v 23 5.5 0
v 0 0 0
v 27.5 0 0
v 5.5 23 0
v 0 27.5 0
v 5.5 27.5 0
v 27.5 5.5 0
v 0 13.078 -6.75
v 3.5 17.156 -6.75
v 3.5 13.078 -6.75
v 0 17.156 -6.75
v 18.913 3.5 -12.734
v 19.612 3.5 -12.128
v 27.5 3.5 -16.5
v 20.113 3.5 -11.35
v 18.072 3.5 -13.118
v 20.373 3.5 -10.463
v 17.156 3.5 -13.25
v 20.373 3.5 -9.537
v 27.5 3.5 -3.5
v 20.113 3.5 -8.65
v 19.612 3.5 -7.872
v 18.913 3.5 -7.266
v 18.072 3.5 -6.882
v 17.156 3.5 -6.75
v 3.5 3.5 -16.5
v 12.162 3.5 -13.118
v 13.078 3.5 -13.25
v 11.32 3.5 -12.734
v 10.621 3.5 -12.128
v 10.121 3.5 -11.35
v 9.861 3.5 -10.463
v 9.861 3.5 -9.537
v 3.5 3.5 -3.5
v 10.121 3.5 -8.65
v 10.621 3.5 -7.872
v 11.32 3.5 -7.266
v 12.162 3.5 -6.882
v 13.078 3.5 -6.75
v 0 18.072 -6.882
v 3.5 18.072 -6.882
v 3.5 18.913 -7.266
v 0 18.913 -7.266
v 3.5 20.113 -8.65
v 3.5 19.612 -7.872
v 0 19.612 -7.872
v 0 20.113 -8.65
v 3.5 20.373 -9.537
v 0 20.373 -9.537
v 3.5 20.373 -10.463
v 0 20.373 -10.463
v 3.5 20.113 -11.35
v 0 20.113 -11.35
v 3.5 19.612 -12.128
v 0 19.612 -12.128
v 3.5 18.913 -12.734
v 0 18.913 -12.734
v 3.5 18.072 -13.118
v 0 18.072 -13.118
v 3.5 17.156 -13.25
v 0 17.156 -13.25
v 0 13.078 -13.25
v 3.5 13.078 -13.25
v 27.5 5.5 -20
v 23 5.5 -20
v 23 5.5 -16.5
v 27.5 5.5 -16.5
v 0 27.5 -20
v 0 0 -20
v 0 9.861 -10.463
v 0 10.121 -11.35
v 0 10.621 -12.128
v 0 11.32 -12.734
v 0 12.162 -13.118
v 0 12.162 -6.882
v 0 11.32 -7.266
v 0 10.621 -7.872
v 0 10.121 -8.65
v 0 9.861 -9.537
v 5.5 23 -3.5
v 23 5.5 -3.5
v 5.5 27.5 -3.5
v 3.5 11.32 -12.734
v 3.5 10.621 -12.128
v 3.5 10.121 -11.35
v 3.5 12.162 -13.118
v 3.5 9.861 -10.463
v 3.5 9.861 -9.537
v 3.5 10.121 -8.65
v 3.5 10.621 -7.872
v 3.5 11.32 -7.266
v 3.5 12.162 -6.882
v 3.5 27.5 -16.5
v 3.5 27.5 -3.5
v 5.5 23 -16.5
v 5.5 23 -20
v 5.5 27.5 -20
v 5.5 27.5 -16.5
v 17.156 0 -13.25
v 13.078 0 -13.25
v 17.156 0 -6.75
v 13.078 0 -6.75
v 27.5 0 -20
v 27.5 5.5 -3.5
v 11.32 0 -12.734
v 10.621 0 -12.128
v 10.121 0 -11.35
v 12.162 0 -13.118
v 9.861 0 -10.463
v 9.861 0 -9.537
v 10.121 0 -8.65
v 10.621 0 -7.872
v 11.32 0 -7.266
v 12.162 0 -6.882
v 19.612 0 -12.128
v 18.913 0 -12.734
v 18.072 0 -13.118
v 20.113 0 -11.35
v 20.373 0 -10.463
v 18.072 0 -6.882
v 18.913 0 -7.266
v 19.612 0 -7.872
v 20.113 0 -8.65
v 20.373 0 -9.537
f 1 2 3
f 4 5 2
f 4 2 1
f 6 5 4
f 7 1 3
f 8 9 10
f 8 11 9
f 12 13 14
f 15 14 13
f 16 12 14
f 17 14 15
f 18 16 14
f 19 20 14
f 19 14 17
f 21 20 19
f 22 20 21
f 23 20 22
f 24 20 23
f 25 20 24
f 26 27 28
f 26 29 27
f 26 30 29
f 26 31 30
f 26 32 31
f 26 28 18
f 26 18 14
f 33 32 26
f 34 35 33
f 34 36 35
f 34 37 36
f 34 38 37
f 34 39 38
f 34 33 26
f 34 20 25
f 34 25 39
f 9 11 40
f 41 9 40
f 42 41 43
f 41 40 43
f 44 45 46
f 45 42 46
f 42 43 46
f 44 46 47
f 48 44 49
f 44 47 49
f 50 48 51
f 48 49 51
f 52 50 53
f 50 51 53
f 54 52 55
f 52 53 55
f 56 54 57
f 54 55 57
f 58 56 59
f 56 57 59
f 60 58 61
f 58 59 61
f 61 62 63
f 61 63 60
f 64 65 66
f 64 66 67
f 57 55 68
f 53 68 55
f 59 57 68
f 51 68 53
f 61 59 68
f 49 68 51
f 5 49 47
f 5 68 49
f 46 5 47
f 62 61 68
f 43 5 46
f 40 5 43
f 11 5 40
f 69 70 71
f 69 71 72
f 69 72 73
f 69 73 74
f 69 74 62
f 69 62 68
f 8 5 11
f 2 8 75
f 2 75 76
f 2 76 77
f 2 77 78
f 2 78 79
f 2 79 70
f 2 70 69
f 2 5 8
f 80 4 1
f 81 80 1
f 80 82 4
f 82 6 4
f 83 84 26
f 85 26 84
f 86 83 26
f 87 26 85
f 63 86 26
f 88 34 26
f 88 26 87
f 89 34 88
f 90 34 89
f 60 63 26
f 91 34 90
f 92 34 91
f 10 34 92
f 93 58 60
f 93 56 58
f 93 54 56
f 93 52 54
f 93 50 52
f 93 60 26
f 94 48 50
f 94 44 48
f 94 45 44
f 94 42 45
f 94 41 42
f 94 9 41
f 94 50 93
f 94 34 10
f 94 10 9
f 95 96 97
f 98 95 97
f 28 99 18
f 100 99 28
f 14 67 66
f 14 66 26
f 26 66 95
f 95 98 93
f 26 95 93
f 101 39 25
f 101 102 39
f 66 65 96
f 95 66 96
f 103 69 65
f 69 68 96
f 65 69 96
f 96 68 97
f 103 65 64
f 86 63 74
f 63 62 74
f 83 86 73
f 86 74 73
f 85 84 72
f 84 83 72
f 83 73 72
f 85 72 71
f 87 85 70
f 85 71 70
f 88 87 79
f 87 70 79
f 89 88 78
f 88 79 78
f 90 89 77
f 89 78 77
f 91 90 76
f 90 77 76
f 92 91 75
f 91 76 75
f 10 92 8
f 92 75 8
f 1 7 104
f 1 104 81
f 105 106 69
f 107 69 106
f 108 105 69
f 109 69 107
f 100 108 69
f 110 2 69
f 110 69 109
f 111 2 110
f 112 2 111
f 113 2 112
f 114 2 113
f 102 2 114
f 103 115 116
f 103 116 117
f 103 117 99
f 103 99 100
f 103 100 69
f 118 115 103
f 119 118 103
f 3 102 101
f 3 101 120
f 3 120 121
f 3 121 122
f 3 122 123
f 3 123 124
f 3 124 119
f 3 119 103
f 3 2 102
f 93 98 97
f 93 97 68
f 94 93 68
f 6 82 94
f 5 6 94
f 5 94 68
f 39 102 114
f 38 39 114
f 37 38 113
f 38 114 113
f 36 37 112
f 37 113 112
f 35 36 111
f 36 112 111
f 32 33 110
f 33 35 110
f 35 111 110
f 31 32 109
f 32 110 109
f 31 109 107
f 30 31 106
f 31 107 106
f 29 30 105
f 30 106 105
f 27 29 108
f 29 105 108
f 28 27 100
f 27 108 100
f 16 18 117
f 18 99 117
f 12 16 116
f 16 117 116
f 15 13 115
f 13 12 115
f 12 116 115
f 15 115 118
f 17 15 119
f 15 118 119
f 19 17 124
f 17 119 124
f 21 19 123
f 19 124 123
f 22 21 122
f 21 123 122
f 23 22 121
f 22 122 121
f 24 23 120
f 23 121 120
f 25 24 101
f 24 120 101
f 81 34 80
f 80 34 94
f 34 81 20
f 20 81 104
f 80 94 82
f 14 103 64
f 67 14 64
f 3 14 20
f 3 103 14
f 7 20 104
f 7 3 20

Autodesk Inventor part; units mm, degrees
ref_plane "YZ Plane" through (0, 0, 0) normal (1, 0, 0) x (0, 1, 0)
sketch "Sketch1" plane through (0, 0, 0) normal (0, 0, 1) x (1, 0, 0)
  line L0 (0, 0) -> (27.5, 0)
  line L1 (27.5, 0) -> (27.5, 5.5)
  line L2 (27.5, 5.5) -> (23, 5.5)
  line L3 (0, 0) -> (0, 27.5)
  line L4 (0, 0) -> (27.5, 0) construction
  line L5 (0, 27.5) -> (5.5, 27.5)
  line L6 (5.5, 27.5) -> (5.5, 23)
  line L7 (5.5, 23) -> (23, 5.5)
  dimension "d0" = 27.5
  dimension "d1" = 5.5
  dimension "d2" = 4.5
  dimension "d3" = 27.5
  dimension "d4" = 90
  dimension "d5" = 5.5
  dimension "d6" = 4.5
sketch "Sketch2" plane through (0, 0, 0) normal (0, 0, 1) x (1, 0, 0)
  line L0 (0, 0) -> (3.5, 0)
  line L1 (3.5, 3.5) -> (3.5, 27.5)
  line L2 (3.5, 27.5) -> (0, 27.5)
  line L3 (0, 27.5) -> (0, 0)
  line L4 (0, 0) -> (27.5, 0)
  line L5 (27.5, 0) -> (27.5, 3.5)
  line L6 (27.5, 3.5) -> (3.5, 3.5)
  line L7 (0, 3.5) -> (0, 0)
  dimension "d7" = 3.5
  dimension "d8" = 27.5
  dimension "d9" = 27.5
  dimension "d10" = 3.5
extrude "Extrusion1" add sketch "Sketch2" against normal blind 20
extrude "Extrusion2" add sketch "Sketch1" against normal blind 3.5
ref_plane "Work Plane1" through (0, 0, -10) normal (0, 0, 1) x (1, 0, 0)
mirror "Mirror1" about plane through (0, 0, -10) normal (0, 0, 1) of "Extrusion2"
sketch "Sketch3" plane through (0, 0, 0) normal (-1, 0, 0) x (0, 0, 1)
  line L0 (0, 0) -> (-20, 0) construction
  line L1 (-10, 0) -> (-10, 15) construction
  line L2 (-10, 14.8275) -> (-6.75, 14.8275) construction
  line L3 (-6.75, 14.8275) -> (-6.75, 9.8275) construction
  line L4 (-10, 9.8275) -> (-10, 14.8275) construction
  line L5 (-13.25, 13.0775) -> (-13.25, 17.1562)
  line L6 (-10, 20.4062) -> (-10, 20.4062)
  line L7 (-6.75, 17.1562) -> (-6.75, 13.0775)
  arc A0 (-10, 20.4062) -> (-13.25, 17.1562) centre (-10, 17.1562) ccw
  arc A1 (-6.75, 17.1562) -> (-10, 20.4062) centre (-10, 17.1562) ccw
  arc A2 (-13.25, 13.0775) -> (-10, 9.8275) centre (-10, 13.0775) ccw
  line L8 (-10, 9.8275) -> (-10, 9.8275)
  arc A3 (-10, 9.8275) -> (-6.75, 13.0775) centre (-10, 13.0775) ccw
  point P0 (-13.25, 20.4062)
  point P1 (-6.75, 20.4062)
  dimension "d16" = 15
  dimension "d17" = 3.25
  dimension "d18" = 5
  dimension "d19" = 6.5
  dimension "d20" = 3.25
  dimension "d21" = 3.25
extrude "Extrusion3" cut sketch "Sketch3" against normal through all
ref_plane "Work Plane2" through (0, 0, 0) normal (0.7071, -0.7071, 0) x (0, 0, -1)
mirror "Mirror2" about plane through (0, 0, 0) normal (0.7071, -0.7071, 0) of "Extrusion3"
properties part number "bracket"
